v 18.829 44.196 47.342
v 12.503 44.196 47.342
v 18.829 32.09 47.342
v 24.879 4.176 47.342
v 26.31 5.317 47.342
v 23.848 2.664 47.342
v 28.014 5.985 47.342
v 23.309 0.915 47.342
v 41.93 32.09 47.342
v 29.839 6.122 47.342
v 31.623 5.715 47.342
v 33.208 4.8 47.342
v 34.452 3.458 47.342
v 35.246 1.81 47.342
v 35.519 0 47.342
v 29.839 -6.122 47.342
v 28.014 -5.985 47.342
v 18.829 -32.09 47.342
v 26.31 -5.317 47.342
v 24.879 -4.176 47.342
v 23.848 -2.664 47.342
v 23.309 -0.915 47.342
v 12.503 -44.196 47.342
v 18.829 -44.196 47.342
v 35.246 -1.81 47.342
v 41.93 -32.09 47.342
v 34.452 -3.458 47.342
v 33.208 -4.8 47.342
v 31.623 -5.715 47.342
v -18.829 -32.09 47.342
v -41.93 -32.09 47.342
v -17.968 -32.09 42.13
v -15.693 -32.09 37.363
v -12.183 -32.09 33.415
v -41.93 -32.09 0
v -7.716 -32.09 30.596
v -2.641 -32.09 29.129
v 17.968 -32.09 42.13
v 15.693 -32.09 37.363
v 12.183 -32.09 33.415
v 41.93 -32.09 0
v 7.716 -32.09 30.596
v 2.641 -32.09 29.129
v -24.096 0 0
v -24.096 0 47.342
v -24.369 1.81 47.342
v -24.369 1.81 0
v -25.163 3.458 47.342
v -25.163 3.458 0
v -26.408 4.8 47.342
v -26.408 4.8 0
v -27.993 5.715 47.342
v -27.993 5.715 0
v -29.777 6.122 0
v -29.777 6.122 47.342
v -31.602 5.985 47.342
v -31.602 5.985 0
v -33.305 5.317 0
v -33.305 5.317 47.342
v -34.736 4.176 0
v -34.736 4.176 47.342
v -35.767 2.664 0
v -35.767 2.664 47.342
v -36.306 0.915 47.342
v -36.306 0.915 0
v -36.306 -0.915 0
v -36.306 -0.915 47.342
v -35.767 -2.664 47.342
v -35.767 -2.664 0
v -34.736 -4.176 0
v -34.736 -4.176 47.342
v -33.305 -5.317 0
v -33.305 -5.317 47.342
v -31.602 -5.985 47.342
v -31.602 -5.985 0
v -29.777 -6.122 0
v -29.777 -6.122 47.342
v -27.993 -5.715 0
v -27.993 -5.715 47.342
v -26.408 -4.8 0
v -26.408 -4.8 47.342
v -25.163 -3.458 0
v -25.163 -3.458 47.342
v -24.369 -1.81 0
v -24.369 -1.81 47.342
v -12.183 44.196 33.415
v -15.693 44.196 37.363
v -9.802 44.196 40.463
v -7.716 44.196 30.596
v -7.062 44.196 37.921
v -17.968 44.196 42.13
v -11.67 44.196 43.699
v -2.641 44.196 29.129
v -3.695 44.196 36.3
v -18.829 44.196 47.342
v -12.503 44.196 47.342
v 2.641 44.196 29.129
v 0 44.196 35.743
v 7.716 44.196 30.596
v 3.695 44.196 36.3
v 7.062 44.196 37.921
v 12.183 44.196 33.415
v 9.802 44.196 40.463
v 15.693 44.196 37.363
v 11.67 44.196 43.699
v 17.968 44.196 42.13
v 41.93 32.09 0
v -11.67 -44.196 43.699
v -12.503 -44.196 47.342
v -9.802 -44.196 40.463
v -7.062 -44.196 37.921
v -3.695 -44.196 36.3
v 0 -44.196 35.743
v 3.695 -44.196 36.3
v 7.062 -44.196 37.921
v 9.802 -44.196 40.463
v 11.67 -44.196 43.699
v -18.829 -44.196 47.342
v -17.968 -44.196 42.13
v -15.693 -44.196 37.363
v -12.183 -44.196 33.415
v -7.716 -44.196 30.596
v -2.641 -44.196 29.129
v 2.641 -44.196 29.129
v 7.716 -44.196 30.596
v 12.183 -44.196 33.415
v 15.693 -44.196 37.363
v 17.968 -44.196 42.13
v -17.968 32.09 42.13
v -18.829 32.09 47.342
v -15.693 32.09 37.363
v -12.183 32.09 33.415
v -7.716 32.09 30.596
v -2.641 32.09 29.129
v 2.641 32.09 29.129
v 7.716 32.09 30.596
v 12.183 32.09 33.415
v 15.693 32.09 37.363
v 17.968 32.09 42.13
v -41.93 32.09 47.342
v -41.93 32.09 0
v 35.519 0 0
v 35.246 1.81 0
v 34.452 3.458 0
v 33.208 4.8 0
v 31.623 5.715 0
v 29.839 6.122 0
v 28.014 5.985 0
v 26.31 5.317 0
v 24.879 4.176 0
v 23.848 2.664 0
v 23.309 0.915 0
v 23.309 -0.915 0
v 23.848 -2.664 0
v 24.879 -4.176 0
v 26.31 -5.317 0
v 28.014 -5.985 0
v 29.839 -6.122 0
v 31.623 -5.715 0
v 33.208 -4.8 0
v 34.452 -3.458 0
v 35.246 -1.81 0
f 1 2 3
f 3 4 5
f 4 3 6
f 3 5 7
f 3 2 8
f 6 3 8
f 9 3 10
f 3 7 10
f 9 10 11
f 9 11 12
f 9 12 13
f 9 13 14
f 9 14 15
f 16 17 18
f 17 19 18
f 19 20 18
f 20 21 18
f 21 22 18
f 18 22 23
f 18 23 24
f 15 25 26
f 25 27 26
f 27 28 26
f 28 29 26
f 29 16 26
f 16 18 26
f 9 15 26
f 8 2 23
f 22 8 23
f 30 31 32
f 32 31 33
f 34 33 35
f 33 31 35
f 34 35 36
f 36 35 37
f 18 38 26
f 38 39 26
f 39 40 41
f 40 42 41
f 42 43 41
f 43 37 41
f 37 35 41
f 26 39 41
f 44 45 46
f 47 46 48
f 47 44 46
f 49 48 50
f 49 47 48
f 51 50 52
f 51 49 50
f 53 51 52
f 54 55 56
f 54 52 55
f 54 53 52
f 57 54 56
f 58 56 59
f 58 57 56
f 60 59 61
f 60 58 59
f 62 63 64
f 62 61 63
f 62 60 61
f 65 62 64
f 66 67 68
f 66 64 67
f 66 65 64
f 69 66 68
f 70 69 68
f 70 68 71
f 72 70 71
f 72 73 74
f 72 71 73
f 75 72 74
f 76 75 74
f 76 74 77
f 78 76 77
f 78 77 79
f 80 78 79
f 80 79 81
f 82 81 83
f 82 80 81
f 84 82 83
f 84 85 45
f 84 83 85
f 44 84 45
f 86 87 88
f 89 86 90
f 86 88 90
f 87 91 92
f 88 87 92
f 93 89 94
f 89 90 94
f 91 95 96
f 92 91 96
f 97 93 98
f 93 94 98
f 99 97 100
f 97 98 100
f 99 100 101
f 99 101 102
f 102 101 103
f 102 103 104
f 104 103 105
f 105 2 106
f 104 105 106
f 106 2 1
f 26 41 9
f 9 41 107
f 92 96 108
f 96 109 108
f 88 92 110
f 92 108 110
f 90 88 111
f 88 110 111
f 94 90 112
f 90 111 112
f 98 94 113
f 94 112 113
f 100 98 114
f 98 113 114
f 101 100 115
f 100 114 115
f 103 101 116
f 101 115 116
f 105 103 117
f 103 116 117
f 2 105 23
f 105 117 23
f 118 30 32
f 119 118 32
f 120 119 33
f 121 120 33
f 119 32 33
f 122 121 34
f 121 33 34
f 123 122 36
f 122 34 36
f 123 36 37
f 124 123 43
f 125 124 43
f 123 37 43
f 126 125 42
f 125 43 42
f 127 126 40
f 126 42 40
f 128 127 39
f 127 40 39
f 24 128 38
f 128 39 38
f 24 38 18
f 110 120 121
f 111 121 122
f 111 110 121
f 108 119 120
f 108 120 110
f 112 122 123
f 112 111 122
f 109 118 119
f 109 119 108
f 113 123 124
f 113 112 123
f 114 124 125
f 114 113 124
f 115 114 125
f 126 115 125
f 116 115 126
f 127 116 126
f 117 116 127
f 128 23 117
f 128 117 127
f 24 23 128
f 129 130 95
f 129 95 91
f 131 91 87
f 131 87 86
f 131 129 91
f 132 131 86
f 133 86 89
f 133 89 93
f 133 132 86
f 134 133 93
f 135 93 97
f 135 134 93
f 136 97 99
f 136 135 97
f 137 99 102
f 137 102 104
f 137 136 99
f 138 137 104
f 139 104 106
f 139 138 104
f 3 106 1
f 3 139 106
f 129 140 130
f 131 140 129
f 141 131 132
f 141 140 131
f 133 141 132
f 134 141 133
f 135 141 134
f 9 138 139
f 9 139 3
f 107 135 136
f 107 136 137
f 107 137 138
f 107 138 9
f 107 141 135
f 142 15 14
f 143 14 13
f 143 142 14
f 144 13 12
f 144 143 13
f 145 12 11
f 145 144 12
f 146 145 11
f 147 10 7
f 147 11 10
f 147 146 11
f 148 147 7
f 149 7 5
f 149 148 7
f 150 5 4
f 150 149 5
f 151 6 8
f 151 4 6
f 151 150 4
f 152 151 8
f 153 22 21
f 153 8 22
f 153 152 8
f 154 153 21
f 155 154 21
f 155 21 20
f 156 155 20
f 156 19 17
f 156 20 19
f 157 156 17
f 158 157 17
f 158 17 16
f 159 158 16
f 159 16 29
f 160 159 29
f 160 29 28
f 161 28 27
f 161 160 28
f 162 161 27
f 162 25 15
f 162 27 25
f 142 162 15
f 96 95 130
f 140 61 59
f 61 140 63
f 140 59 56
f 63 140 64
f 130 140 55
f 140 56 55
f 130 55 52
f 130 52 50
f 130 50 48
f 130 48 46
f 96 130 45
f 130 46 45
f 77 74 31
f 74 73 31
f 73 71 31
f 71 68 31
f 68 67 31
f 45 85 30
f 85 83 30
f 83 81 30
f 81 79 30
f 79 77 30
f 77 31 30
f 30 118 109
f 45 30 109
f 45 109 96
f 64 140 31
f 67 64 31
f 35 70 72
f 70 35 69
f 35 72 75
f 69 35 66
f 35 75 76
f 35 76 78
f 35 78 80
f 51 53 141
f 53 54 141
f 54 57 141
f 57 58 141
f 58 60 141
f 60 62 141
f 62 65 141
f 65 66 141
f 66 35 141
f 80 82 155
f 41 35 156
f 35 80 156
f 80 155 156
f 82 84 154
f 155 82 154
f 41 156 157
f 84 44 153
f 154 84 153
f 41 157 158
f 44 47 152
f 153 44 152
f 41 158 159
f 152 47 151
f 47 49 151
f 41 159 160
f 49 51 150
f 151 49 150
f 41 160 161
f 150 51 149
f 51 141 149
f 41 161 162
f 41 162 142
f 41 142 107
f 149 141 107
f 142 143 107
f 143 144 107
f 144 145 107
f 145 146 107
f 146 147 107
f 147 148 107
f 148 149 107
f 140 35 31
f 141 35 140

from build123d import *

# Parameters (mm, degrees)
F0_W          = 83.8607475162
F0_H          = 64.1791447997
F1_DEPTH      = 48.26
F2_R          = 18.8345255186
F3_DEPTH      = 44.196
F3_DEPTH_BACK = 44.196
F4_R          = 12.5378078108
F5_DEPTH      = 44.197
F5_DEPTH_BACK = 44.197
F7_DEPTH      = 44.197
F7_DEPTH_BACK = 44.197
F8_R          = 6.1393043091
F8_R_2        = 6.139306213
F9_DEPTH      = 154
F9_DEPTH_BACK = 47.3427378962


# Not quite as in the source:
# - an extrude ends at something that could not be found from the text; its depth is read off the source's solid


with BuildPart() as f1:
    # F0 (on Top) → F1 (new body)
    with BuildSketch(Plane.XY):
        Rectangle(F0_W, F0_H)
    extrude(amount=F1_DEPTH)

    # F2 (on Front) → F3 (join, two sides)
    with BuildSketch(Plane.XZ) as f3_sk:
        with Locations((0, 47.7778092027)):
            Circle(F2_R)
    extrude(amount=F3_DEPTH)
    extrude(f3_sk.sketch, amount=-F3_DEPTH_BACK)

    # F4 (on Front) → F5 (cut, two sides)
    with BuildSketch(Plane.XZ) as f5_sk:
        with Locations((0, 48.2809320092)):
            Circle(F4_R)
    extrude(amount=-F5_DEPTH, mode=Mode.SUBTRACT)
    extrude(f5_sk.sketch, amount=F5_DEPTH_BACK, mode=Mode.SUBTRACT)

    # F6 (on Front) → F7 (cut, two sides)
    with BuildSketch(Plane.XZ) as f7_sk:
        Polygon((-43.335814029, 47.3417378962), (42.9494790733, 47.3417378962), (48.3834594488, 70.2134892344), (-43.335814029, 70.2134892344), align=None)
    extrude(amount=-F7_DEPTH, mode=Mode.SUBTRACT)
    extrude(f7_sk.sketch, amount=F7_DEPTH_BACK, mode=Mode.SUBTRACT)

    # F8 (on Top) → F9 (cut, two sides)
    with BuildSketch(Plane.XY) as f9_sk:
        with Locations((-30.2355084568, 0)):
            Circle(F8_R)
        with Locations((29.3797850609, 0)):
            Circle(F8_R_2)
    extrude(amount=-F9_DEPTH, mode=Mode.SUBTRACT)
    extrude(f9_sk.sketch, amount=F9_DEPTH_BACK, mode=Mode.SUBTRACT)


solid = f1.part
